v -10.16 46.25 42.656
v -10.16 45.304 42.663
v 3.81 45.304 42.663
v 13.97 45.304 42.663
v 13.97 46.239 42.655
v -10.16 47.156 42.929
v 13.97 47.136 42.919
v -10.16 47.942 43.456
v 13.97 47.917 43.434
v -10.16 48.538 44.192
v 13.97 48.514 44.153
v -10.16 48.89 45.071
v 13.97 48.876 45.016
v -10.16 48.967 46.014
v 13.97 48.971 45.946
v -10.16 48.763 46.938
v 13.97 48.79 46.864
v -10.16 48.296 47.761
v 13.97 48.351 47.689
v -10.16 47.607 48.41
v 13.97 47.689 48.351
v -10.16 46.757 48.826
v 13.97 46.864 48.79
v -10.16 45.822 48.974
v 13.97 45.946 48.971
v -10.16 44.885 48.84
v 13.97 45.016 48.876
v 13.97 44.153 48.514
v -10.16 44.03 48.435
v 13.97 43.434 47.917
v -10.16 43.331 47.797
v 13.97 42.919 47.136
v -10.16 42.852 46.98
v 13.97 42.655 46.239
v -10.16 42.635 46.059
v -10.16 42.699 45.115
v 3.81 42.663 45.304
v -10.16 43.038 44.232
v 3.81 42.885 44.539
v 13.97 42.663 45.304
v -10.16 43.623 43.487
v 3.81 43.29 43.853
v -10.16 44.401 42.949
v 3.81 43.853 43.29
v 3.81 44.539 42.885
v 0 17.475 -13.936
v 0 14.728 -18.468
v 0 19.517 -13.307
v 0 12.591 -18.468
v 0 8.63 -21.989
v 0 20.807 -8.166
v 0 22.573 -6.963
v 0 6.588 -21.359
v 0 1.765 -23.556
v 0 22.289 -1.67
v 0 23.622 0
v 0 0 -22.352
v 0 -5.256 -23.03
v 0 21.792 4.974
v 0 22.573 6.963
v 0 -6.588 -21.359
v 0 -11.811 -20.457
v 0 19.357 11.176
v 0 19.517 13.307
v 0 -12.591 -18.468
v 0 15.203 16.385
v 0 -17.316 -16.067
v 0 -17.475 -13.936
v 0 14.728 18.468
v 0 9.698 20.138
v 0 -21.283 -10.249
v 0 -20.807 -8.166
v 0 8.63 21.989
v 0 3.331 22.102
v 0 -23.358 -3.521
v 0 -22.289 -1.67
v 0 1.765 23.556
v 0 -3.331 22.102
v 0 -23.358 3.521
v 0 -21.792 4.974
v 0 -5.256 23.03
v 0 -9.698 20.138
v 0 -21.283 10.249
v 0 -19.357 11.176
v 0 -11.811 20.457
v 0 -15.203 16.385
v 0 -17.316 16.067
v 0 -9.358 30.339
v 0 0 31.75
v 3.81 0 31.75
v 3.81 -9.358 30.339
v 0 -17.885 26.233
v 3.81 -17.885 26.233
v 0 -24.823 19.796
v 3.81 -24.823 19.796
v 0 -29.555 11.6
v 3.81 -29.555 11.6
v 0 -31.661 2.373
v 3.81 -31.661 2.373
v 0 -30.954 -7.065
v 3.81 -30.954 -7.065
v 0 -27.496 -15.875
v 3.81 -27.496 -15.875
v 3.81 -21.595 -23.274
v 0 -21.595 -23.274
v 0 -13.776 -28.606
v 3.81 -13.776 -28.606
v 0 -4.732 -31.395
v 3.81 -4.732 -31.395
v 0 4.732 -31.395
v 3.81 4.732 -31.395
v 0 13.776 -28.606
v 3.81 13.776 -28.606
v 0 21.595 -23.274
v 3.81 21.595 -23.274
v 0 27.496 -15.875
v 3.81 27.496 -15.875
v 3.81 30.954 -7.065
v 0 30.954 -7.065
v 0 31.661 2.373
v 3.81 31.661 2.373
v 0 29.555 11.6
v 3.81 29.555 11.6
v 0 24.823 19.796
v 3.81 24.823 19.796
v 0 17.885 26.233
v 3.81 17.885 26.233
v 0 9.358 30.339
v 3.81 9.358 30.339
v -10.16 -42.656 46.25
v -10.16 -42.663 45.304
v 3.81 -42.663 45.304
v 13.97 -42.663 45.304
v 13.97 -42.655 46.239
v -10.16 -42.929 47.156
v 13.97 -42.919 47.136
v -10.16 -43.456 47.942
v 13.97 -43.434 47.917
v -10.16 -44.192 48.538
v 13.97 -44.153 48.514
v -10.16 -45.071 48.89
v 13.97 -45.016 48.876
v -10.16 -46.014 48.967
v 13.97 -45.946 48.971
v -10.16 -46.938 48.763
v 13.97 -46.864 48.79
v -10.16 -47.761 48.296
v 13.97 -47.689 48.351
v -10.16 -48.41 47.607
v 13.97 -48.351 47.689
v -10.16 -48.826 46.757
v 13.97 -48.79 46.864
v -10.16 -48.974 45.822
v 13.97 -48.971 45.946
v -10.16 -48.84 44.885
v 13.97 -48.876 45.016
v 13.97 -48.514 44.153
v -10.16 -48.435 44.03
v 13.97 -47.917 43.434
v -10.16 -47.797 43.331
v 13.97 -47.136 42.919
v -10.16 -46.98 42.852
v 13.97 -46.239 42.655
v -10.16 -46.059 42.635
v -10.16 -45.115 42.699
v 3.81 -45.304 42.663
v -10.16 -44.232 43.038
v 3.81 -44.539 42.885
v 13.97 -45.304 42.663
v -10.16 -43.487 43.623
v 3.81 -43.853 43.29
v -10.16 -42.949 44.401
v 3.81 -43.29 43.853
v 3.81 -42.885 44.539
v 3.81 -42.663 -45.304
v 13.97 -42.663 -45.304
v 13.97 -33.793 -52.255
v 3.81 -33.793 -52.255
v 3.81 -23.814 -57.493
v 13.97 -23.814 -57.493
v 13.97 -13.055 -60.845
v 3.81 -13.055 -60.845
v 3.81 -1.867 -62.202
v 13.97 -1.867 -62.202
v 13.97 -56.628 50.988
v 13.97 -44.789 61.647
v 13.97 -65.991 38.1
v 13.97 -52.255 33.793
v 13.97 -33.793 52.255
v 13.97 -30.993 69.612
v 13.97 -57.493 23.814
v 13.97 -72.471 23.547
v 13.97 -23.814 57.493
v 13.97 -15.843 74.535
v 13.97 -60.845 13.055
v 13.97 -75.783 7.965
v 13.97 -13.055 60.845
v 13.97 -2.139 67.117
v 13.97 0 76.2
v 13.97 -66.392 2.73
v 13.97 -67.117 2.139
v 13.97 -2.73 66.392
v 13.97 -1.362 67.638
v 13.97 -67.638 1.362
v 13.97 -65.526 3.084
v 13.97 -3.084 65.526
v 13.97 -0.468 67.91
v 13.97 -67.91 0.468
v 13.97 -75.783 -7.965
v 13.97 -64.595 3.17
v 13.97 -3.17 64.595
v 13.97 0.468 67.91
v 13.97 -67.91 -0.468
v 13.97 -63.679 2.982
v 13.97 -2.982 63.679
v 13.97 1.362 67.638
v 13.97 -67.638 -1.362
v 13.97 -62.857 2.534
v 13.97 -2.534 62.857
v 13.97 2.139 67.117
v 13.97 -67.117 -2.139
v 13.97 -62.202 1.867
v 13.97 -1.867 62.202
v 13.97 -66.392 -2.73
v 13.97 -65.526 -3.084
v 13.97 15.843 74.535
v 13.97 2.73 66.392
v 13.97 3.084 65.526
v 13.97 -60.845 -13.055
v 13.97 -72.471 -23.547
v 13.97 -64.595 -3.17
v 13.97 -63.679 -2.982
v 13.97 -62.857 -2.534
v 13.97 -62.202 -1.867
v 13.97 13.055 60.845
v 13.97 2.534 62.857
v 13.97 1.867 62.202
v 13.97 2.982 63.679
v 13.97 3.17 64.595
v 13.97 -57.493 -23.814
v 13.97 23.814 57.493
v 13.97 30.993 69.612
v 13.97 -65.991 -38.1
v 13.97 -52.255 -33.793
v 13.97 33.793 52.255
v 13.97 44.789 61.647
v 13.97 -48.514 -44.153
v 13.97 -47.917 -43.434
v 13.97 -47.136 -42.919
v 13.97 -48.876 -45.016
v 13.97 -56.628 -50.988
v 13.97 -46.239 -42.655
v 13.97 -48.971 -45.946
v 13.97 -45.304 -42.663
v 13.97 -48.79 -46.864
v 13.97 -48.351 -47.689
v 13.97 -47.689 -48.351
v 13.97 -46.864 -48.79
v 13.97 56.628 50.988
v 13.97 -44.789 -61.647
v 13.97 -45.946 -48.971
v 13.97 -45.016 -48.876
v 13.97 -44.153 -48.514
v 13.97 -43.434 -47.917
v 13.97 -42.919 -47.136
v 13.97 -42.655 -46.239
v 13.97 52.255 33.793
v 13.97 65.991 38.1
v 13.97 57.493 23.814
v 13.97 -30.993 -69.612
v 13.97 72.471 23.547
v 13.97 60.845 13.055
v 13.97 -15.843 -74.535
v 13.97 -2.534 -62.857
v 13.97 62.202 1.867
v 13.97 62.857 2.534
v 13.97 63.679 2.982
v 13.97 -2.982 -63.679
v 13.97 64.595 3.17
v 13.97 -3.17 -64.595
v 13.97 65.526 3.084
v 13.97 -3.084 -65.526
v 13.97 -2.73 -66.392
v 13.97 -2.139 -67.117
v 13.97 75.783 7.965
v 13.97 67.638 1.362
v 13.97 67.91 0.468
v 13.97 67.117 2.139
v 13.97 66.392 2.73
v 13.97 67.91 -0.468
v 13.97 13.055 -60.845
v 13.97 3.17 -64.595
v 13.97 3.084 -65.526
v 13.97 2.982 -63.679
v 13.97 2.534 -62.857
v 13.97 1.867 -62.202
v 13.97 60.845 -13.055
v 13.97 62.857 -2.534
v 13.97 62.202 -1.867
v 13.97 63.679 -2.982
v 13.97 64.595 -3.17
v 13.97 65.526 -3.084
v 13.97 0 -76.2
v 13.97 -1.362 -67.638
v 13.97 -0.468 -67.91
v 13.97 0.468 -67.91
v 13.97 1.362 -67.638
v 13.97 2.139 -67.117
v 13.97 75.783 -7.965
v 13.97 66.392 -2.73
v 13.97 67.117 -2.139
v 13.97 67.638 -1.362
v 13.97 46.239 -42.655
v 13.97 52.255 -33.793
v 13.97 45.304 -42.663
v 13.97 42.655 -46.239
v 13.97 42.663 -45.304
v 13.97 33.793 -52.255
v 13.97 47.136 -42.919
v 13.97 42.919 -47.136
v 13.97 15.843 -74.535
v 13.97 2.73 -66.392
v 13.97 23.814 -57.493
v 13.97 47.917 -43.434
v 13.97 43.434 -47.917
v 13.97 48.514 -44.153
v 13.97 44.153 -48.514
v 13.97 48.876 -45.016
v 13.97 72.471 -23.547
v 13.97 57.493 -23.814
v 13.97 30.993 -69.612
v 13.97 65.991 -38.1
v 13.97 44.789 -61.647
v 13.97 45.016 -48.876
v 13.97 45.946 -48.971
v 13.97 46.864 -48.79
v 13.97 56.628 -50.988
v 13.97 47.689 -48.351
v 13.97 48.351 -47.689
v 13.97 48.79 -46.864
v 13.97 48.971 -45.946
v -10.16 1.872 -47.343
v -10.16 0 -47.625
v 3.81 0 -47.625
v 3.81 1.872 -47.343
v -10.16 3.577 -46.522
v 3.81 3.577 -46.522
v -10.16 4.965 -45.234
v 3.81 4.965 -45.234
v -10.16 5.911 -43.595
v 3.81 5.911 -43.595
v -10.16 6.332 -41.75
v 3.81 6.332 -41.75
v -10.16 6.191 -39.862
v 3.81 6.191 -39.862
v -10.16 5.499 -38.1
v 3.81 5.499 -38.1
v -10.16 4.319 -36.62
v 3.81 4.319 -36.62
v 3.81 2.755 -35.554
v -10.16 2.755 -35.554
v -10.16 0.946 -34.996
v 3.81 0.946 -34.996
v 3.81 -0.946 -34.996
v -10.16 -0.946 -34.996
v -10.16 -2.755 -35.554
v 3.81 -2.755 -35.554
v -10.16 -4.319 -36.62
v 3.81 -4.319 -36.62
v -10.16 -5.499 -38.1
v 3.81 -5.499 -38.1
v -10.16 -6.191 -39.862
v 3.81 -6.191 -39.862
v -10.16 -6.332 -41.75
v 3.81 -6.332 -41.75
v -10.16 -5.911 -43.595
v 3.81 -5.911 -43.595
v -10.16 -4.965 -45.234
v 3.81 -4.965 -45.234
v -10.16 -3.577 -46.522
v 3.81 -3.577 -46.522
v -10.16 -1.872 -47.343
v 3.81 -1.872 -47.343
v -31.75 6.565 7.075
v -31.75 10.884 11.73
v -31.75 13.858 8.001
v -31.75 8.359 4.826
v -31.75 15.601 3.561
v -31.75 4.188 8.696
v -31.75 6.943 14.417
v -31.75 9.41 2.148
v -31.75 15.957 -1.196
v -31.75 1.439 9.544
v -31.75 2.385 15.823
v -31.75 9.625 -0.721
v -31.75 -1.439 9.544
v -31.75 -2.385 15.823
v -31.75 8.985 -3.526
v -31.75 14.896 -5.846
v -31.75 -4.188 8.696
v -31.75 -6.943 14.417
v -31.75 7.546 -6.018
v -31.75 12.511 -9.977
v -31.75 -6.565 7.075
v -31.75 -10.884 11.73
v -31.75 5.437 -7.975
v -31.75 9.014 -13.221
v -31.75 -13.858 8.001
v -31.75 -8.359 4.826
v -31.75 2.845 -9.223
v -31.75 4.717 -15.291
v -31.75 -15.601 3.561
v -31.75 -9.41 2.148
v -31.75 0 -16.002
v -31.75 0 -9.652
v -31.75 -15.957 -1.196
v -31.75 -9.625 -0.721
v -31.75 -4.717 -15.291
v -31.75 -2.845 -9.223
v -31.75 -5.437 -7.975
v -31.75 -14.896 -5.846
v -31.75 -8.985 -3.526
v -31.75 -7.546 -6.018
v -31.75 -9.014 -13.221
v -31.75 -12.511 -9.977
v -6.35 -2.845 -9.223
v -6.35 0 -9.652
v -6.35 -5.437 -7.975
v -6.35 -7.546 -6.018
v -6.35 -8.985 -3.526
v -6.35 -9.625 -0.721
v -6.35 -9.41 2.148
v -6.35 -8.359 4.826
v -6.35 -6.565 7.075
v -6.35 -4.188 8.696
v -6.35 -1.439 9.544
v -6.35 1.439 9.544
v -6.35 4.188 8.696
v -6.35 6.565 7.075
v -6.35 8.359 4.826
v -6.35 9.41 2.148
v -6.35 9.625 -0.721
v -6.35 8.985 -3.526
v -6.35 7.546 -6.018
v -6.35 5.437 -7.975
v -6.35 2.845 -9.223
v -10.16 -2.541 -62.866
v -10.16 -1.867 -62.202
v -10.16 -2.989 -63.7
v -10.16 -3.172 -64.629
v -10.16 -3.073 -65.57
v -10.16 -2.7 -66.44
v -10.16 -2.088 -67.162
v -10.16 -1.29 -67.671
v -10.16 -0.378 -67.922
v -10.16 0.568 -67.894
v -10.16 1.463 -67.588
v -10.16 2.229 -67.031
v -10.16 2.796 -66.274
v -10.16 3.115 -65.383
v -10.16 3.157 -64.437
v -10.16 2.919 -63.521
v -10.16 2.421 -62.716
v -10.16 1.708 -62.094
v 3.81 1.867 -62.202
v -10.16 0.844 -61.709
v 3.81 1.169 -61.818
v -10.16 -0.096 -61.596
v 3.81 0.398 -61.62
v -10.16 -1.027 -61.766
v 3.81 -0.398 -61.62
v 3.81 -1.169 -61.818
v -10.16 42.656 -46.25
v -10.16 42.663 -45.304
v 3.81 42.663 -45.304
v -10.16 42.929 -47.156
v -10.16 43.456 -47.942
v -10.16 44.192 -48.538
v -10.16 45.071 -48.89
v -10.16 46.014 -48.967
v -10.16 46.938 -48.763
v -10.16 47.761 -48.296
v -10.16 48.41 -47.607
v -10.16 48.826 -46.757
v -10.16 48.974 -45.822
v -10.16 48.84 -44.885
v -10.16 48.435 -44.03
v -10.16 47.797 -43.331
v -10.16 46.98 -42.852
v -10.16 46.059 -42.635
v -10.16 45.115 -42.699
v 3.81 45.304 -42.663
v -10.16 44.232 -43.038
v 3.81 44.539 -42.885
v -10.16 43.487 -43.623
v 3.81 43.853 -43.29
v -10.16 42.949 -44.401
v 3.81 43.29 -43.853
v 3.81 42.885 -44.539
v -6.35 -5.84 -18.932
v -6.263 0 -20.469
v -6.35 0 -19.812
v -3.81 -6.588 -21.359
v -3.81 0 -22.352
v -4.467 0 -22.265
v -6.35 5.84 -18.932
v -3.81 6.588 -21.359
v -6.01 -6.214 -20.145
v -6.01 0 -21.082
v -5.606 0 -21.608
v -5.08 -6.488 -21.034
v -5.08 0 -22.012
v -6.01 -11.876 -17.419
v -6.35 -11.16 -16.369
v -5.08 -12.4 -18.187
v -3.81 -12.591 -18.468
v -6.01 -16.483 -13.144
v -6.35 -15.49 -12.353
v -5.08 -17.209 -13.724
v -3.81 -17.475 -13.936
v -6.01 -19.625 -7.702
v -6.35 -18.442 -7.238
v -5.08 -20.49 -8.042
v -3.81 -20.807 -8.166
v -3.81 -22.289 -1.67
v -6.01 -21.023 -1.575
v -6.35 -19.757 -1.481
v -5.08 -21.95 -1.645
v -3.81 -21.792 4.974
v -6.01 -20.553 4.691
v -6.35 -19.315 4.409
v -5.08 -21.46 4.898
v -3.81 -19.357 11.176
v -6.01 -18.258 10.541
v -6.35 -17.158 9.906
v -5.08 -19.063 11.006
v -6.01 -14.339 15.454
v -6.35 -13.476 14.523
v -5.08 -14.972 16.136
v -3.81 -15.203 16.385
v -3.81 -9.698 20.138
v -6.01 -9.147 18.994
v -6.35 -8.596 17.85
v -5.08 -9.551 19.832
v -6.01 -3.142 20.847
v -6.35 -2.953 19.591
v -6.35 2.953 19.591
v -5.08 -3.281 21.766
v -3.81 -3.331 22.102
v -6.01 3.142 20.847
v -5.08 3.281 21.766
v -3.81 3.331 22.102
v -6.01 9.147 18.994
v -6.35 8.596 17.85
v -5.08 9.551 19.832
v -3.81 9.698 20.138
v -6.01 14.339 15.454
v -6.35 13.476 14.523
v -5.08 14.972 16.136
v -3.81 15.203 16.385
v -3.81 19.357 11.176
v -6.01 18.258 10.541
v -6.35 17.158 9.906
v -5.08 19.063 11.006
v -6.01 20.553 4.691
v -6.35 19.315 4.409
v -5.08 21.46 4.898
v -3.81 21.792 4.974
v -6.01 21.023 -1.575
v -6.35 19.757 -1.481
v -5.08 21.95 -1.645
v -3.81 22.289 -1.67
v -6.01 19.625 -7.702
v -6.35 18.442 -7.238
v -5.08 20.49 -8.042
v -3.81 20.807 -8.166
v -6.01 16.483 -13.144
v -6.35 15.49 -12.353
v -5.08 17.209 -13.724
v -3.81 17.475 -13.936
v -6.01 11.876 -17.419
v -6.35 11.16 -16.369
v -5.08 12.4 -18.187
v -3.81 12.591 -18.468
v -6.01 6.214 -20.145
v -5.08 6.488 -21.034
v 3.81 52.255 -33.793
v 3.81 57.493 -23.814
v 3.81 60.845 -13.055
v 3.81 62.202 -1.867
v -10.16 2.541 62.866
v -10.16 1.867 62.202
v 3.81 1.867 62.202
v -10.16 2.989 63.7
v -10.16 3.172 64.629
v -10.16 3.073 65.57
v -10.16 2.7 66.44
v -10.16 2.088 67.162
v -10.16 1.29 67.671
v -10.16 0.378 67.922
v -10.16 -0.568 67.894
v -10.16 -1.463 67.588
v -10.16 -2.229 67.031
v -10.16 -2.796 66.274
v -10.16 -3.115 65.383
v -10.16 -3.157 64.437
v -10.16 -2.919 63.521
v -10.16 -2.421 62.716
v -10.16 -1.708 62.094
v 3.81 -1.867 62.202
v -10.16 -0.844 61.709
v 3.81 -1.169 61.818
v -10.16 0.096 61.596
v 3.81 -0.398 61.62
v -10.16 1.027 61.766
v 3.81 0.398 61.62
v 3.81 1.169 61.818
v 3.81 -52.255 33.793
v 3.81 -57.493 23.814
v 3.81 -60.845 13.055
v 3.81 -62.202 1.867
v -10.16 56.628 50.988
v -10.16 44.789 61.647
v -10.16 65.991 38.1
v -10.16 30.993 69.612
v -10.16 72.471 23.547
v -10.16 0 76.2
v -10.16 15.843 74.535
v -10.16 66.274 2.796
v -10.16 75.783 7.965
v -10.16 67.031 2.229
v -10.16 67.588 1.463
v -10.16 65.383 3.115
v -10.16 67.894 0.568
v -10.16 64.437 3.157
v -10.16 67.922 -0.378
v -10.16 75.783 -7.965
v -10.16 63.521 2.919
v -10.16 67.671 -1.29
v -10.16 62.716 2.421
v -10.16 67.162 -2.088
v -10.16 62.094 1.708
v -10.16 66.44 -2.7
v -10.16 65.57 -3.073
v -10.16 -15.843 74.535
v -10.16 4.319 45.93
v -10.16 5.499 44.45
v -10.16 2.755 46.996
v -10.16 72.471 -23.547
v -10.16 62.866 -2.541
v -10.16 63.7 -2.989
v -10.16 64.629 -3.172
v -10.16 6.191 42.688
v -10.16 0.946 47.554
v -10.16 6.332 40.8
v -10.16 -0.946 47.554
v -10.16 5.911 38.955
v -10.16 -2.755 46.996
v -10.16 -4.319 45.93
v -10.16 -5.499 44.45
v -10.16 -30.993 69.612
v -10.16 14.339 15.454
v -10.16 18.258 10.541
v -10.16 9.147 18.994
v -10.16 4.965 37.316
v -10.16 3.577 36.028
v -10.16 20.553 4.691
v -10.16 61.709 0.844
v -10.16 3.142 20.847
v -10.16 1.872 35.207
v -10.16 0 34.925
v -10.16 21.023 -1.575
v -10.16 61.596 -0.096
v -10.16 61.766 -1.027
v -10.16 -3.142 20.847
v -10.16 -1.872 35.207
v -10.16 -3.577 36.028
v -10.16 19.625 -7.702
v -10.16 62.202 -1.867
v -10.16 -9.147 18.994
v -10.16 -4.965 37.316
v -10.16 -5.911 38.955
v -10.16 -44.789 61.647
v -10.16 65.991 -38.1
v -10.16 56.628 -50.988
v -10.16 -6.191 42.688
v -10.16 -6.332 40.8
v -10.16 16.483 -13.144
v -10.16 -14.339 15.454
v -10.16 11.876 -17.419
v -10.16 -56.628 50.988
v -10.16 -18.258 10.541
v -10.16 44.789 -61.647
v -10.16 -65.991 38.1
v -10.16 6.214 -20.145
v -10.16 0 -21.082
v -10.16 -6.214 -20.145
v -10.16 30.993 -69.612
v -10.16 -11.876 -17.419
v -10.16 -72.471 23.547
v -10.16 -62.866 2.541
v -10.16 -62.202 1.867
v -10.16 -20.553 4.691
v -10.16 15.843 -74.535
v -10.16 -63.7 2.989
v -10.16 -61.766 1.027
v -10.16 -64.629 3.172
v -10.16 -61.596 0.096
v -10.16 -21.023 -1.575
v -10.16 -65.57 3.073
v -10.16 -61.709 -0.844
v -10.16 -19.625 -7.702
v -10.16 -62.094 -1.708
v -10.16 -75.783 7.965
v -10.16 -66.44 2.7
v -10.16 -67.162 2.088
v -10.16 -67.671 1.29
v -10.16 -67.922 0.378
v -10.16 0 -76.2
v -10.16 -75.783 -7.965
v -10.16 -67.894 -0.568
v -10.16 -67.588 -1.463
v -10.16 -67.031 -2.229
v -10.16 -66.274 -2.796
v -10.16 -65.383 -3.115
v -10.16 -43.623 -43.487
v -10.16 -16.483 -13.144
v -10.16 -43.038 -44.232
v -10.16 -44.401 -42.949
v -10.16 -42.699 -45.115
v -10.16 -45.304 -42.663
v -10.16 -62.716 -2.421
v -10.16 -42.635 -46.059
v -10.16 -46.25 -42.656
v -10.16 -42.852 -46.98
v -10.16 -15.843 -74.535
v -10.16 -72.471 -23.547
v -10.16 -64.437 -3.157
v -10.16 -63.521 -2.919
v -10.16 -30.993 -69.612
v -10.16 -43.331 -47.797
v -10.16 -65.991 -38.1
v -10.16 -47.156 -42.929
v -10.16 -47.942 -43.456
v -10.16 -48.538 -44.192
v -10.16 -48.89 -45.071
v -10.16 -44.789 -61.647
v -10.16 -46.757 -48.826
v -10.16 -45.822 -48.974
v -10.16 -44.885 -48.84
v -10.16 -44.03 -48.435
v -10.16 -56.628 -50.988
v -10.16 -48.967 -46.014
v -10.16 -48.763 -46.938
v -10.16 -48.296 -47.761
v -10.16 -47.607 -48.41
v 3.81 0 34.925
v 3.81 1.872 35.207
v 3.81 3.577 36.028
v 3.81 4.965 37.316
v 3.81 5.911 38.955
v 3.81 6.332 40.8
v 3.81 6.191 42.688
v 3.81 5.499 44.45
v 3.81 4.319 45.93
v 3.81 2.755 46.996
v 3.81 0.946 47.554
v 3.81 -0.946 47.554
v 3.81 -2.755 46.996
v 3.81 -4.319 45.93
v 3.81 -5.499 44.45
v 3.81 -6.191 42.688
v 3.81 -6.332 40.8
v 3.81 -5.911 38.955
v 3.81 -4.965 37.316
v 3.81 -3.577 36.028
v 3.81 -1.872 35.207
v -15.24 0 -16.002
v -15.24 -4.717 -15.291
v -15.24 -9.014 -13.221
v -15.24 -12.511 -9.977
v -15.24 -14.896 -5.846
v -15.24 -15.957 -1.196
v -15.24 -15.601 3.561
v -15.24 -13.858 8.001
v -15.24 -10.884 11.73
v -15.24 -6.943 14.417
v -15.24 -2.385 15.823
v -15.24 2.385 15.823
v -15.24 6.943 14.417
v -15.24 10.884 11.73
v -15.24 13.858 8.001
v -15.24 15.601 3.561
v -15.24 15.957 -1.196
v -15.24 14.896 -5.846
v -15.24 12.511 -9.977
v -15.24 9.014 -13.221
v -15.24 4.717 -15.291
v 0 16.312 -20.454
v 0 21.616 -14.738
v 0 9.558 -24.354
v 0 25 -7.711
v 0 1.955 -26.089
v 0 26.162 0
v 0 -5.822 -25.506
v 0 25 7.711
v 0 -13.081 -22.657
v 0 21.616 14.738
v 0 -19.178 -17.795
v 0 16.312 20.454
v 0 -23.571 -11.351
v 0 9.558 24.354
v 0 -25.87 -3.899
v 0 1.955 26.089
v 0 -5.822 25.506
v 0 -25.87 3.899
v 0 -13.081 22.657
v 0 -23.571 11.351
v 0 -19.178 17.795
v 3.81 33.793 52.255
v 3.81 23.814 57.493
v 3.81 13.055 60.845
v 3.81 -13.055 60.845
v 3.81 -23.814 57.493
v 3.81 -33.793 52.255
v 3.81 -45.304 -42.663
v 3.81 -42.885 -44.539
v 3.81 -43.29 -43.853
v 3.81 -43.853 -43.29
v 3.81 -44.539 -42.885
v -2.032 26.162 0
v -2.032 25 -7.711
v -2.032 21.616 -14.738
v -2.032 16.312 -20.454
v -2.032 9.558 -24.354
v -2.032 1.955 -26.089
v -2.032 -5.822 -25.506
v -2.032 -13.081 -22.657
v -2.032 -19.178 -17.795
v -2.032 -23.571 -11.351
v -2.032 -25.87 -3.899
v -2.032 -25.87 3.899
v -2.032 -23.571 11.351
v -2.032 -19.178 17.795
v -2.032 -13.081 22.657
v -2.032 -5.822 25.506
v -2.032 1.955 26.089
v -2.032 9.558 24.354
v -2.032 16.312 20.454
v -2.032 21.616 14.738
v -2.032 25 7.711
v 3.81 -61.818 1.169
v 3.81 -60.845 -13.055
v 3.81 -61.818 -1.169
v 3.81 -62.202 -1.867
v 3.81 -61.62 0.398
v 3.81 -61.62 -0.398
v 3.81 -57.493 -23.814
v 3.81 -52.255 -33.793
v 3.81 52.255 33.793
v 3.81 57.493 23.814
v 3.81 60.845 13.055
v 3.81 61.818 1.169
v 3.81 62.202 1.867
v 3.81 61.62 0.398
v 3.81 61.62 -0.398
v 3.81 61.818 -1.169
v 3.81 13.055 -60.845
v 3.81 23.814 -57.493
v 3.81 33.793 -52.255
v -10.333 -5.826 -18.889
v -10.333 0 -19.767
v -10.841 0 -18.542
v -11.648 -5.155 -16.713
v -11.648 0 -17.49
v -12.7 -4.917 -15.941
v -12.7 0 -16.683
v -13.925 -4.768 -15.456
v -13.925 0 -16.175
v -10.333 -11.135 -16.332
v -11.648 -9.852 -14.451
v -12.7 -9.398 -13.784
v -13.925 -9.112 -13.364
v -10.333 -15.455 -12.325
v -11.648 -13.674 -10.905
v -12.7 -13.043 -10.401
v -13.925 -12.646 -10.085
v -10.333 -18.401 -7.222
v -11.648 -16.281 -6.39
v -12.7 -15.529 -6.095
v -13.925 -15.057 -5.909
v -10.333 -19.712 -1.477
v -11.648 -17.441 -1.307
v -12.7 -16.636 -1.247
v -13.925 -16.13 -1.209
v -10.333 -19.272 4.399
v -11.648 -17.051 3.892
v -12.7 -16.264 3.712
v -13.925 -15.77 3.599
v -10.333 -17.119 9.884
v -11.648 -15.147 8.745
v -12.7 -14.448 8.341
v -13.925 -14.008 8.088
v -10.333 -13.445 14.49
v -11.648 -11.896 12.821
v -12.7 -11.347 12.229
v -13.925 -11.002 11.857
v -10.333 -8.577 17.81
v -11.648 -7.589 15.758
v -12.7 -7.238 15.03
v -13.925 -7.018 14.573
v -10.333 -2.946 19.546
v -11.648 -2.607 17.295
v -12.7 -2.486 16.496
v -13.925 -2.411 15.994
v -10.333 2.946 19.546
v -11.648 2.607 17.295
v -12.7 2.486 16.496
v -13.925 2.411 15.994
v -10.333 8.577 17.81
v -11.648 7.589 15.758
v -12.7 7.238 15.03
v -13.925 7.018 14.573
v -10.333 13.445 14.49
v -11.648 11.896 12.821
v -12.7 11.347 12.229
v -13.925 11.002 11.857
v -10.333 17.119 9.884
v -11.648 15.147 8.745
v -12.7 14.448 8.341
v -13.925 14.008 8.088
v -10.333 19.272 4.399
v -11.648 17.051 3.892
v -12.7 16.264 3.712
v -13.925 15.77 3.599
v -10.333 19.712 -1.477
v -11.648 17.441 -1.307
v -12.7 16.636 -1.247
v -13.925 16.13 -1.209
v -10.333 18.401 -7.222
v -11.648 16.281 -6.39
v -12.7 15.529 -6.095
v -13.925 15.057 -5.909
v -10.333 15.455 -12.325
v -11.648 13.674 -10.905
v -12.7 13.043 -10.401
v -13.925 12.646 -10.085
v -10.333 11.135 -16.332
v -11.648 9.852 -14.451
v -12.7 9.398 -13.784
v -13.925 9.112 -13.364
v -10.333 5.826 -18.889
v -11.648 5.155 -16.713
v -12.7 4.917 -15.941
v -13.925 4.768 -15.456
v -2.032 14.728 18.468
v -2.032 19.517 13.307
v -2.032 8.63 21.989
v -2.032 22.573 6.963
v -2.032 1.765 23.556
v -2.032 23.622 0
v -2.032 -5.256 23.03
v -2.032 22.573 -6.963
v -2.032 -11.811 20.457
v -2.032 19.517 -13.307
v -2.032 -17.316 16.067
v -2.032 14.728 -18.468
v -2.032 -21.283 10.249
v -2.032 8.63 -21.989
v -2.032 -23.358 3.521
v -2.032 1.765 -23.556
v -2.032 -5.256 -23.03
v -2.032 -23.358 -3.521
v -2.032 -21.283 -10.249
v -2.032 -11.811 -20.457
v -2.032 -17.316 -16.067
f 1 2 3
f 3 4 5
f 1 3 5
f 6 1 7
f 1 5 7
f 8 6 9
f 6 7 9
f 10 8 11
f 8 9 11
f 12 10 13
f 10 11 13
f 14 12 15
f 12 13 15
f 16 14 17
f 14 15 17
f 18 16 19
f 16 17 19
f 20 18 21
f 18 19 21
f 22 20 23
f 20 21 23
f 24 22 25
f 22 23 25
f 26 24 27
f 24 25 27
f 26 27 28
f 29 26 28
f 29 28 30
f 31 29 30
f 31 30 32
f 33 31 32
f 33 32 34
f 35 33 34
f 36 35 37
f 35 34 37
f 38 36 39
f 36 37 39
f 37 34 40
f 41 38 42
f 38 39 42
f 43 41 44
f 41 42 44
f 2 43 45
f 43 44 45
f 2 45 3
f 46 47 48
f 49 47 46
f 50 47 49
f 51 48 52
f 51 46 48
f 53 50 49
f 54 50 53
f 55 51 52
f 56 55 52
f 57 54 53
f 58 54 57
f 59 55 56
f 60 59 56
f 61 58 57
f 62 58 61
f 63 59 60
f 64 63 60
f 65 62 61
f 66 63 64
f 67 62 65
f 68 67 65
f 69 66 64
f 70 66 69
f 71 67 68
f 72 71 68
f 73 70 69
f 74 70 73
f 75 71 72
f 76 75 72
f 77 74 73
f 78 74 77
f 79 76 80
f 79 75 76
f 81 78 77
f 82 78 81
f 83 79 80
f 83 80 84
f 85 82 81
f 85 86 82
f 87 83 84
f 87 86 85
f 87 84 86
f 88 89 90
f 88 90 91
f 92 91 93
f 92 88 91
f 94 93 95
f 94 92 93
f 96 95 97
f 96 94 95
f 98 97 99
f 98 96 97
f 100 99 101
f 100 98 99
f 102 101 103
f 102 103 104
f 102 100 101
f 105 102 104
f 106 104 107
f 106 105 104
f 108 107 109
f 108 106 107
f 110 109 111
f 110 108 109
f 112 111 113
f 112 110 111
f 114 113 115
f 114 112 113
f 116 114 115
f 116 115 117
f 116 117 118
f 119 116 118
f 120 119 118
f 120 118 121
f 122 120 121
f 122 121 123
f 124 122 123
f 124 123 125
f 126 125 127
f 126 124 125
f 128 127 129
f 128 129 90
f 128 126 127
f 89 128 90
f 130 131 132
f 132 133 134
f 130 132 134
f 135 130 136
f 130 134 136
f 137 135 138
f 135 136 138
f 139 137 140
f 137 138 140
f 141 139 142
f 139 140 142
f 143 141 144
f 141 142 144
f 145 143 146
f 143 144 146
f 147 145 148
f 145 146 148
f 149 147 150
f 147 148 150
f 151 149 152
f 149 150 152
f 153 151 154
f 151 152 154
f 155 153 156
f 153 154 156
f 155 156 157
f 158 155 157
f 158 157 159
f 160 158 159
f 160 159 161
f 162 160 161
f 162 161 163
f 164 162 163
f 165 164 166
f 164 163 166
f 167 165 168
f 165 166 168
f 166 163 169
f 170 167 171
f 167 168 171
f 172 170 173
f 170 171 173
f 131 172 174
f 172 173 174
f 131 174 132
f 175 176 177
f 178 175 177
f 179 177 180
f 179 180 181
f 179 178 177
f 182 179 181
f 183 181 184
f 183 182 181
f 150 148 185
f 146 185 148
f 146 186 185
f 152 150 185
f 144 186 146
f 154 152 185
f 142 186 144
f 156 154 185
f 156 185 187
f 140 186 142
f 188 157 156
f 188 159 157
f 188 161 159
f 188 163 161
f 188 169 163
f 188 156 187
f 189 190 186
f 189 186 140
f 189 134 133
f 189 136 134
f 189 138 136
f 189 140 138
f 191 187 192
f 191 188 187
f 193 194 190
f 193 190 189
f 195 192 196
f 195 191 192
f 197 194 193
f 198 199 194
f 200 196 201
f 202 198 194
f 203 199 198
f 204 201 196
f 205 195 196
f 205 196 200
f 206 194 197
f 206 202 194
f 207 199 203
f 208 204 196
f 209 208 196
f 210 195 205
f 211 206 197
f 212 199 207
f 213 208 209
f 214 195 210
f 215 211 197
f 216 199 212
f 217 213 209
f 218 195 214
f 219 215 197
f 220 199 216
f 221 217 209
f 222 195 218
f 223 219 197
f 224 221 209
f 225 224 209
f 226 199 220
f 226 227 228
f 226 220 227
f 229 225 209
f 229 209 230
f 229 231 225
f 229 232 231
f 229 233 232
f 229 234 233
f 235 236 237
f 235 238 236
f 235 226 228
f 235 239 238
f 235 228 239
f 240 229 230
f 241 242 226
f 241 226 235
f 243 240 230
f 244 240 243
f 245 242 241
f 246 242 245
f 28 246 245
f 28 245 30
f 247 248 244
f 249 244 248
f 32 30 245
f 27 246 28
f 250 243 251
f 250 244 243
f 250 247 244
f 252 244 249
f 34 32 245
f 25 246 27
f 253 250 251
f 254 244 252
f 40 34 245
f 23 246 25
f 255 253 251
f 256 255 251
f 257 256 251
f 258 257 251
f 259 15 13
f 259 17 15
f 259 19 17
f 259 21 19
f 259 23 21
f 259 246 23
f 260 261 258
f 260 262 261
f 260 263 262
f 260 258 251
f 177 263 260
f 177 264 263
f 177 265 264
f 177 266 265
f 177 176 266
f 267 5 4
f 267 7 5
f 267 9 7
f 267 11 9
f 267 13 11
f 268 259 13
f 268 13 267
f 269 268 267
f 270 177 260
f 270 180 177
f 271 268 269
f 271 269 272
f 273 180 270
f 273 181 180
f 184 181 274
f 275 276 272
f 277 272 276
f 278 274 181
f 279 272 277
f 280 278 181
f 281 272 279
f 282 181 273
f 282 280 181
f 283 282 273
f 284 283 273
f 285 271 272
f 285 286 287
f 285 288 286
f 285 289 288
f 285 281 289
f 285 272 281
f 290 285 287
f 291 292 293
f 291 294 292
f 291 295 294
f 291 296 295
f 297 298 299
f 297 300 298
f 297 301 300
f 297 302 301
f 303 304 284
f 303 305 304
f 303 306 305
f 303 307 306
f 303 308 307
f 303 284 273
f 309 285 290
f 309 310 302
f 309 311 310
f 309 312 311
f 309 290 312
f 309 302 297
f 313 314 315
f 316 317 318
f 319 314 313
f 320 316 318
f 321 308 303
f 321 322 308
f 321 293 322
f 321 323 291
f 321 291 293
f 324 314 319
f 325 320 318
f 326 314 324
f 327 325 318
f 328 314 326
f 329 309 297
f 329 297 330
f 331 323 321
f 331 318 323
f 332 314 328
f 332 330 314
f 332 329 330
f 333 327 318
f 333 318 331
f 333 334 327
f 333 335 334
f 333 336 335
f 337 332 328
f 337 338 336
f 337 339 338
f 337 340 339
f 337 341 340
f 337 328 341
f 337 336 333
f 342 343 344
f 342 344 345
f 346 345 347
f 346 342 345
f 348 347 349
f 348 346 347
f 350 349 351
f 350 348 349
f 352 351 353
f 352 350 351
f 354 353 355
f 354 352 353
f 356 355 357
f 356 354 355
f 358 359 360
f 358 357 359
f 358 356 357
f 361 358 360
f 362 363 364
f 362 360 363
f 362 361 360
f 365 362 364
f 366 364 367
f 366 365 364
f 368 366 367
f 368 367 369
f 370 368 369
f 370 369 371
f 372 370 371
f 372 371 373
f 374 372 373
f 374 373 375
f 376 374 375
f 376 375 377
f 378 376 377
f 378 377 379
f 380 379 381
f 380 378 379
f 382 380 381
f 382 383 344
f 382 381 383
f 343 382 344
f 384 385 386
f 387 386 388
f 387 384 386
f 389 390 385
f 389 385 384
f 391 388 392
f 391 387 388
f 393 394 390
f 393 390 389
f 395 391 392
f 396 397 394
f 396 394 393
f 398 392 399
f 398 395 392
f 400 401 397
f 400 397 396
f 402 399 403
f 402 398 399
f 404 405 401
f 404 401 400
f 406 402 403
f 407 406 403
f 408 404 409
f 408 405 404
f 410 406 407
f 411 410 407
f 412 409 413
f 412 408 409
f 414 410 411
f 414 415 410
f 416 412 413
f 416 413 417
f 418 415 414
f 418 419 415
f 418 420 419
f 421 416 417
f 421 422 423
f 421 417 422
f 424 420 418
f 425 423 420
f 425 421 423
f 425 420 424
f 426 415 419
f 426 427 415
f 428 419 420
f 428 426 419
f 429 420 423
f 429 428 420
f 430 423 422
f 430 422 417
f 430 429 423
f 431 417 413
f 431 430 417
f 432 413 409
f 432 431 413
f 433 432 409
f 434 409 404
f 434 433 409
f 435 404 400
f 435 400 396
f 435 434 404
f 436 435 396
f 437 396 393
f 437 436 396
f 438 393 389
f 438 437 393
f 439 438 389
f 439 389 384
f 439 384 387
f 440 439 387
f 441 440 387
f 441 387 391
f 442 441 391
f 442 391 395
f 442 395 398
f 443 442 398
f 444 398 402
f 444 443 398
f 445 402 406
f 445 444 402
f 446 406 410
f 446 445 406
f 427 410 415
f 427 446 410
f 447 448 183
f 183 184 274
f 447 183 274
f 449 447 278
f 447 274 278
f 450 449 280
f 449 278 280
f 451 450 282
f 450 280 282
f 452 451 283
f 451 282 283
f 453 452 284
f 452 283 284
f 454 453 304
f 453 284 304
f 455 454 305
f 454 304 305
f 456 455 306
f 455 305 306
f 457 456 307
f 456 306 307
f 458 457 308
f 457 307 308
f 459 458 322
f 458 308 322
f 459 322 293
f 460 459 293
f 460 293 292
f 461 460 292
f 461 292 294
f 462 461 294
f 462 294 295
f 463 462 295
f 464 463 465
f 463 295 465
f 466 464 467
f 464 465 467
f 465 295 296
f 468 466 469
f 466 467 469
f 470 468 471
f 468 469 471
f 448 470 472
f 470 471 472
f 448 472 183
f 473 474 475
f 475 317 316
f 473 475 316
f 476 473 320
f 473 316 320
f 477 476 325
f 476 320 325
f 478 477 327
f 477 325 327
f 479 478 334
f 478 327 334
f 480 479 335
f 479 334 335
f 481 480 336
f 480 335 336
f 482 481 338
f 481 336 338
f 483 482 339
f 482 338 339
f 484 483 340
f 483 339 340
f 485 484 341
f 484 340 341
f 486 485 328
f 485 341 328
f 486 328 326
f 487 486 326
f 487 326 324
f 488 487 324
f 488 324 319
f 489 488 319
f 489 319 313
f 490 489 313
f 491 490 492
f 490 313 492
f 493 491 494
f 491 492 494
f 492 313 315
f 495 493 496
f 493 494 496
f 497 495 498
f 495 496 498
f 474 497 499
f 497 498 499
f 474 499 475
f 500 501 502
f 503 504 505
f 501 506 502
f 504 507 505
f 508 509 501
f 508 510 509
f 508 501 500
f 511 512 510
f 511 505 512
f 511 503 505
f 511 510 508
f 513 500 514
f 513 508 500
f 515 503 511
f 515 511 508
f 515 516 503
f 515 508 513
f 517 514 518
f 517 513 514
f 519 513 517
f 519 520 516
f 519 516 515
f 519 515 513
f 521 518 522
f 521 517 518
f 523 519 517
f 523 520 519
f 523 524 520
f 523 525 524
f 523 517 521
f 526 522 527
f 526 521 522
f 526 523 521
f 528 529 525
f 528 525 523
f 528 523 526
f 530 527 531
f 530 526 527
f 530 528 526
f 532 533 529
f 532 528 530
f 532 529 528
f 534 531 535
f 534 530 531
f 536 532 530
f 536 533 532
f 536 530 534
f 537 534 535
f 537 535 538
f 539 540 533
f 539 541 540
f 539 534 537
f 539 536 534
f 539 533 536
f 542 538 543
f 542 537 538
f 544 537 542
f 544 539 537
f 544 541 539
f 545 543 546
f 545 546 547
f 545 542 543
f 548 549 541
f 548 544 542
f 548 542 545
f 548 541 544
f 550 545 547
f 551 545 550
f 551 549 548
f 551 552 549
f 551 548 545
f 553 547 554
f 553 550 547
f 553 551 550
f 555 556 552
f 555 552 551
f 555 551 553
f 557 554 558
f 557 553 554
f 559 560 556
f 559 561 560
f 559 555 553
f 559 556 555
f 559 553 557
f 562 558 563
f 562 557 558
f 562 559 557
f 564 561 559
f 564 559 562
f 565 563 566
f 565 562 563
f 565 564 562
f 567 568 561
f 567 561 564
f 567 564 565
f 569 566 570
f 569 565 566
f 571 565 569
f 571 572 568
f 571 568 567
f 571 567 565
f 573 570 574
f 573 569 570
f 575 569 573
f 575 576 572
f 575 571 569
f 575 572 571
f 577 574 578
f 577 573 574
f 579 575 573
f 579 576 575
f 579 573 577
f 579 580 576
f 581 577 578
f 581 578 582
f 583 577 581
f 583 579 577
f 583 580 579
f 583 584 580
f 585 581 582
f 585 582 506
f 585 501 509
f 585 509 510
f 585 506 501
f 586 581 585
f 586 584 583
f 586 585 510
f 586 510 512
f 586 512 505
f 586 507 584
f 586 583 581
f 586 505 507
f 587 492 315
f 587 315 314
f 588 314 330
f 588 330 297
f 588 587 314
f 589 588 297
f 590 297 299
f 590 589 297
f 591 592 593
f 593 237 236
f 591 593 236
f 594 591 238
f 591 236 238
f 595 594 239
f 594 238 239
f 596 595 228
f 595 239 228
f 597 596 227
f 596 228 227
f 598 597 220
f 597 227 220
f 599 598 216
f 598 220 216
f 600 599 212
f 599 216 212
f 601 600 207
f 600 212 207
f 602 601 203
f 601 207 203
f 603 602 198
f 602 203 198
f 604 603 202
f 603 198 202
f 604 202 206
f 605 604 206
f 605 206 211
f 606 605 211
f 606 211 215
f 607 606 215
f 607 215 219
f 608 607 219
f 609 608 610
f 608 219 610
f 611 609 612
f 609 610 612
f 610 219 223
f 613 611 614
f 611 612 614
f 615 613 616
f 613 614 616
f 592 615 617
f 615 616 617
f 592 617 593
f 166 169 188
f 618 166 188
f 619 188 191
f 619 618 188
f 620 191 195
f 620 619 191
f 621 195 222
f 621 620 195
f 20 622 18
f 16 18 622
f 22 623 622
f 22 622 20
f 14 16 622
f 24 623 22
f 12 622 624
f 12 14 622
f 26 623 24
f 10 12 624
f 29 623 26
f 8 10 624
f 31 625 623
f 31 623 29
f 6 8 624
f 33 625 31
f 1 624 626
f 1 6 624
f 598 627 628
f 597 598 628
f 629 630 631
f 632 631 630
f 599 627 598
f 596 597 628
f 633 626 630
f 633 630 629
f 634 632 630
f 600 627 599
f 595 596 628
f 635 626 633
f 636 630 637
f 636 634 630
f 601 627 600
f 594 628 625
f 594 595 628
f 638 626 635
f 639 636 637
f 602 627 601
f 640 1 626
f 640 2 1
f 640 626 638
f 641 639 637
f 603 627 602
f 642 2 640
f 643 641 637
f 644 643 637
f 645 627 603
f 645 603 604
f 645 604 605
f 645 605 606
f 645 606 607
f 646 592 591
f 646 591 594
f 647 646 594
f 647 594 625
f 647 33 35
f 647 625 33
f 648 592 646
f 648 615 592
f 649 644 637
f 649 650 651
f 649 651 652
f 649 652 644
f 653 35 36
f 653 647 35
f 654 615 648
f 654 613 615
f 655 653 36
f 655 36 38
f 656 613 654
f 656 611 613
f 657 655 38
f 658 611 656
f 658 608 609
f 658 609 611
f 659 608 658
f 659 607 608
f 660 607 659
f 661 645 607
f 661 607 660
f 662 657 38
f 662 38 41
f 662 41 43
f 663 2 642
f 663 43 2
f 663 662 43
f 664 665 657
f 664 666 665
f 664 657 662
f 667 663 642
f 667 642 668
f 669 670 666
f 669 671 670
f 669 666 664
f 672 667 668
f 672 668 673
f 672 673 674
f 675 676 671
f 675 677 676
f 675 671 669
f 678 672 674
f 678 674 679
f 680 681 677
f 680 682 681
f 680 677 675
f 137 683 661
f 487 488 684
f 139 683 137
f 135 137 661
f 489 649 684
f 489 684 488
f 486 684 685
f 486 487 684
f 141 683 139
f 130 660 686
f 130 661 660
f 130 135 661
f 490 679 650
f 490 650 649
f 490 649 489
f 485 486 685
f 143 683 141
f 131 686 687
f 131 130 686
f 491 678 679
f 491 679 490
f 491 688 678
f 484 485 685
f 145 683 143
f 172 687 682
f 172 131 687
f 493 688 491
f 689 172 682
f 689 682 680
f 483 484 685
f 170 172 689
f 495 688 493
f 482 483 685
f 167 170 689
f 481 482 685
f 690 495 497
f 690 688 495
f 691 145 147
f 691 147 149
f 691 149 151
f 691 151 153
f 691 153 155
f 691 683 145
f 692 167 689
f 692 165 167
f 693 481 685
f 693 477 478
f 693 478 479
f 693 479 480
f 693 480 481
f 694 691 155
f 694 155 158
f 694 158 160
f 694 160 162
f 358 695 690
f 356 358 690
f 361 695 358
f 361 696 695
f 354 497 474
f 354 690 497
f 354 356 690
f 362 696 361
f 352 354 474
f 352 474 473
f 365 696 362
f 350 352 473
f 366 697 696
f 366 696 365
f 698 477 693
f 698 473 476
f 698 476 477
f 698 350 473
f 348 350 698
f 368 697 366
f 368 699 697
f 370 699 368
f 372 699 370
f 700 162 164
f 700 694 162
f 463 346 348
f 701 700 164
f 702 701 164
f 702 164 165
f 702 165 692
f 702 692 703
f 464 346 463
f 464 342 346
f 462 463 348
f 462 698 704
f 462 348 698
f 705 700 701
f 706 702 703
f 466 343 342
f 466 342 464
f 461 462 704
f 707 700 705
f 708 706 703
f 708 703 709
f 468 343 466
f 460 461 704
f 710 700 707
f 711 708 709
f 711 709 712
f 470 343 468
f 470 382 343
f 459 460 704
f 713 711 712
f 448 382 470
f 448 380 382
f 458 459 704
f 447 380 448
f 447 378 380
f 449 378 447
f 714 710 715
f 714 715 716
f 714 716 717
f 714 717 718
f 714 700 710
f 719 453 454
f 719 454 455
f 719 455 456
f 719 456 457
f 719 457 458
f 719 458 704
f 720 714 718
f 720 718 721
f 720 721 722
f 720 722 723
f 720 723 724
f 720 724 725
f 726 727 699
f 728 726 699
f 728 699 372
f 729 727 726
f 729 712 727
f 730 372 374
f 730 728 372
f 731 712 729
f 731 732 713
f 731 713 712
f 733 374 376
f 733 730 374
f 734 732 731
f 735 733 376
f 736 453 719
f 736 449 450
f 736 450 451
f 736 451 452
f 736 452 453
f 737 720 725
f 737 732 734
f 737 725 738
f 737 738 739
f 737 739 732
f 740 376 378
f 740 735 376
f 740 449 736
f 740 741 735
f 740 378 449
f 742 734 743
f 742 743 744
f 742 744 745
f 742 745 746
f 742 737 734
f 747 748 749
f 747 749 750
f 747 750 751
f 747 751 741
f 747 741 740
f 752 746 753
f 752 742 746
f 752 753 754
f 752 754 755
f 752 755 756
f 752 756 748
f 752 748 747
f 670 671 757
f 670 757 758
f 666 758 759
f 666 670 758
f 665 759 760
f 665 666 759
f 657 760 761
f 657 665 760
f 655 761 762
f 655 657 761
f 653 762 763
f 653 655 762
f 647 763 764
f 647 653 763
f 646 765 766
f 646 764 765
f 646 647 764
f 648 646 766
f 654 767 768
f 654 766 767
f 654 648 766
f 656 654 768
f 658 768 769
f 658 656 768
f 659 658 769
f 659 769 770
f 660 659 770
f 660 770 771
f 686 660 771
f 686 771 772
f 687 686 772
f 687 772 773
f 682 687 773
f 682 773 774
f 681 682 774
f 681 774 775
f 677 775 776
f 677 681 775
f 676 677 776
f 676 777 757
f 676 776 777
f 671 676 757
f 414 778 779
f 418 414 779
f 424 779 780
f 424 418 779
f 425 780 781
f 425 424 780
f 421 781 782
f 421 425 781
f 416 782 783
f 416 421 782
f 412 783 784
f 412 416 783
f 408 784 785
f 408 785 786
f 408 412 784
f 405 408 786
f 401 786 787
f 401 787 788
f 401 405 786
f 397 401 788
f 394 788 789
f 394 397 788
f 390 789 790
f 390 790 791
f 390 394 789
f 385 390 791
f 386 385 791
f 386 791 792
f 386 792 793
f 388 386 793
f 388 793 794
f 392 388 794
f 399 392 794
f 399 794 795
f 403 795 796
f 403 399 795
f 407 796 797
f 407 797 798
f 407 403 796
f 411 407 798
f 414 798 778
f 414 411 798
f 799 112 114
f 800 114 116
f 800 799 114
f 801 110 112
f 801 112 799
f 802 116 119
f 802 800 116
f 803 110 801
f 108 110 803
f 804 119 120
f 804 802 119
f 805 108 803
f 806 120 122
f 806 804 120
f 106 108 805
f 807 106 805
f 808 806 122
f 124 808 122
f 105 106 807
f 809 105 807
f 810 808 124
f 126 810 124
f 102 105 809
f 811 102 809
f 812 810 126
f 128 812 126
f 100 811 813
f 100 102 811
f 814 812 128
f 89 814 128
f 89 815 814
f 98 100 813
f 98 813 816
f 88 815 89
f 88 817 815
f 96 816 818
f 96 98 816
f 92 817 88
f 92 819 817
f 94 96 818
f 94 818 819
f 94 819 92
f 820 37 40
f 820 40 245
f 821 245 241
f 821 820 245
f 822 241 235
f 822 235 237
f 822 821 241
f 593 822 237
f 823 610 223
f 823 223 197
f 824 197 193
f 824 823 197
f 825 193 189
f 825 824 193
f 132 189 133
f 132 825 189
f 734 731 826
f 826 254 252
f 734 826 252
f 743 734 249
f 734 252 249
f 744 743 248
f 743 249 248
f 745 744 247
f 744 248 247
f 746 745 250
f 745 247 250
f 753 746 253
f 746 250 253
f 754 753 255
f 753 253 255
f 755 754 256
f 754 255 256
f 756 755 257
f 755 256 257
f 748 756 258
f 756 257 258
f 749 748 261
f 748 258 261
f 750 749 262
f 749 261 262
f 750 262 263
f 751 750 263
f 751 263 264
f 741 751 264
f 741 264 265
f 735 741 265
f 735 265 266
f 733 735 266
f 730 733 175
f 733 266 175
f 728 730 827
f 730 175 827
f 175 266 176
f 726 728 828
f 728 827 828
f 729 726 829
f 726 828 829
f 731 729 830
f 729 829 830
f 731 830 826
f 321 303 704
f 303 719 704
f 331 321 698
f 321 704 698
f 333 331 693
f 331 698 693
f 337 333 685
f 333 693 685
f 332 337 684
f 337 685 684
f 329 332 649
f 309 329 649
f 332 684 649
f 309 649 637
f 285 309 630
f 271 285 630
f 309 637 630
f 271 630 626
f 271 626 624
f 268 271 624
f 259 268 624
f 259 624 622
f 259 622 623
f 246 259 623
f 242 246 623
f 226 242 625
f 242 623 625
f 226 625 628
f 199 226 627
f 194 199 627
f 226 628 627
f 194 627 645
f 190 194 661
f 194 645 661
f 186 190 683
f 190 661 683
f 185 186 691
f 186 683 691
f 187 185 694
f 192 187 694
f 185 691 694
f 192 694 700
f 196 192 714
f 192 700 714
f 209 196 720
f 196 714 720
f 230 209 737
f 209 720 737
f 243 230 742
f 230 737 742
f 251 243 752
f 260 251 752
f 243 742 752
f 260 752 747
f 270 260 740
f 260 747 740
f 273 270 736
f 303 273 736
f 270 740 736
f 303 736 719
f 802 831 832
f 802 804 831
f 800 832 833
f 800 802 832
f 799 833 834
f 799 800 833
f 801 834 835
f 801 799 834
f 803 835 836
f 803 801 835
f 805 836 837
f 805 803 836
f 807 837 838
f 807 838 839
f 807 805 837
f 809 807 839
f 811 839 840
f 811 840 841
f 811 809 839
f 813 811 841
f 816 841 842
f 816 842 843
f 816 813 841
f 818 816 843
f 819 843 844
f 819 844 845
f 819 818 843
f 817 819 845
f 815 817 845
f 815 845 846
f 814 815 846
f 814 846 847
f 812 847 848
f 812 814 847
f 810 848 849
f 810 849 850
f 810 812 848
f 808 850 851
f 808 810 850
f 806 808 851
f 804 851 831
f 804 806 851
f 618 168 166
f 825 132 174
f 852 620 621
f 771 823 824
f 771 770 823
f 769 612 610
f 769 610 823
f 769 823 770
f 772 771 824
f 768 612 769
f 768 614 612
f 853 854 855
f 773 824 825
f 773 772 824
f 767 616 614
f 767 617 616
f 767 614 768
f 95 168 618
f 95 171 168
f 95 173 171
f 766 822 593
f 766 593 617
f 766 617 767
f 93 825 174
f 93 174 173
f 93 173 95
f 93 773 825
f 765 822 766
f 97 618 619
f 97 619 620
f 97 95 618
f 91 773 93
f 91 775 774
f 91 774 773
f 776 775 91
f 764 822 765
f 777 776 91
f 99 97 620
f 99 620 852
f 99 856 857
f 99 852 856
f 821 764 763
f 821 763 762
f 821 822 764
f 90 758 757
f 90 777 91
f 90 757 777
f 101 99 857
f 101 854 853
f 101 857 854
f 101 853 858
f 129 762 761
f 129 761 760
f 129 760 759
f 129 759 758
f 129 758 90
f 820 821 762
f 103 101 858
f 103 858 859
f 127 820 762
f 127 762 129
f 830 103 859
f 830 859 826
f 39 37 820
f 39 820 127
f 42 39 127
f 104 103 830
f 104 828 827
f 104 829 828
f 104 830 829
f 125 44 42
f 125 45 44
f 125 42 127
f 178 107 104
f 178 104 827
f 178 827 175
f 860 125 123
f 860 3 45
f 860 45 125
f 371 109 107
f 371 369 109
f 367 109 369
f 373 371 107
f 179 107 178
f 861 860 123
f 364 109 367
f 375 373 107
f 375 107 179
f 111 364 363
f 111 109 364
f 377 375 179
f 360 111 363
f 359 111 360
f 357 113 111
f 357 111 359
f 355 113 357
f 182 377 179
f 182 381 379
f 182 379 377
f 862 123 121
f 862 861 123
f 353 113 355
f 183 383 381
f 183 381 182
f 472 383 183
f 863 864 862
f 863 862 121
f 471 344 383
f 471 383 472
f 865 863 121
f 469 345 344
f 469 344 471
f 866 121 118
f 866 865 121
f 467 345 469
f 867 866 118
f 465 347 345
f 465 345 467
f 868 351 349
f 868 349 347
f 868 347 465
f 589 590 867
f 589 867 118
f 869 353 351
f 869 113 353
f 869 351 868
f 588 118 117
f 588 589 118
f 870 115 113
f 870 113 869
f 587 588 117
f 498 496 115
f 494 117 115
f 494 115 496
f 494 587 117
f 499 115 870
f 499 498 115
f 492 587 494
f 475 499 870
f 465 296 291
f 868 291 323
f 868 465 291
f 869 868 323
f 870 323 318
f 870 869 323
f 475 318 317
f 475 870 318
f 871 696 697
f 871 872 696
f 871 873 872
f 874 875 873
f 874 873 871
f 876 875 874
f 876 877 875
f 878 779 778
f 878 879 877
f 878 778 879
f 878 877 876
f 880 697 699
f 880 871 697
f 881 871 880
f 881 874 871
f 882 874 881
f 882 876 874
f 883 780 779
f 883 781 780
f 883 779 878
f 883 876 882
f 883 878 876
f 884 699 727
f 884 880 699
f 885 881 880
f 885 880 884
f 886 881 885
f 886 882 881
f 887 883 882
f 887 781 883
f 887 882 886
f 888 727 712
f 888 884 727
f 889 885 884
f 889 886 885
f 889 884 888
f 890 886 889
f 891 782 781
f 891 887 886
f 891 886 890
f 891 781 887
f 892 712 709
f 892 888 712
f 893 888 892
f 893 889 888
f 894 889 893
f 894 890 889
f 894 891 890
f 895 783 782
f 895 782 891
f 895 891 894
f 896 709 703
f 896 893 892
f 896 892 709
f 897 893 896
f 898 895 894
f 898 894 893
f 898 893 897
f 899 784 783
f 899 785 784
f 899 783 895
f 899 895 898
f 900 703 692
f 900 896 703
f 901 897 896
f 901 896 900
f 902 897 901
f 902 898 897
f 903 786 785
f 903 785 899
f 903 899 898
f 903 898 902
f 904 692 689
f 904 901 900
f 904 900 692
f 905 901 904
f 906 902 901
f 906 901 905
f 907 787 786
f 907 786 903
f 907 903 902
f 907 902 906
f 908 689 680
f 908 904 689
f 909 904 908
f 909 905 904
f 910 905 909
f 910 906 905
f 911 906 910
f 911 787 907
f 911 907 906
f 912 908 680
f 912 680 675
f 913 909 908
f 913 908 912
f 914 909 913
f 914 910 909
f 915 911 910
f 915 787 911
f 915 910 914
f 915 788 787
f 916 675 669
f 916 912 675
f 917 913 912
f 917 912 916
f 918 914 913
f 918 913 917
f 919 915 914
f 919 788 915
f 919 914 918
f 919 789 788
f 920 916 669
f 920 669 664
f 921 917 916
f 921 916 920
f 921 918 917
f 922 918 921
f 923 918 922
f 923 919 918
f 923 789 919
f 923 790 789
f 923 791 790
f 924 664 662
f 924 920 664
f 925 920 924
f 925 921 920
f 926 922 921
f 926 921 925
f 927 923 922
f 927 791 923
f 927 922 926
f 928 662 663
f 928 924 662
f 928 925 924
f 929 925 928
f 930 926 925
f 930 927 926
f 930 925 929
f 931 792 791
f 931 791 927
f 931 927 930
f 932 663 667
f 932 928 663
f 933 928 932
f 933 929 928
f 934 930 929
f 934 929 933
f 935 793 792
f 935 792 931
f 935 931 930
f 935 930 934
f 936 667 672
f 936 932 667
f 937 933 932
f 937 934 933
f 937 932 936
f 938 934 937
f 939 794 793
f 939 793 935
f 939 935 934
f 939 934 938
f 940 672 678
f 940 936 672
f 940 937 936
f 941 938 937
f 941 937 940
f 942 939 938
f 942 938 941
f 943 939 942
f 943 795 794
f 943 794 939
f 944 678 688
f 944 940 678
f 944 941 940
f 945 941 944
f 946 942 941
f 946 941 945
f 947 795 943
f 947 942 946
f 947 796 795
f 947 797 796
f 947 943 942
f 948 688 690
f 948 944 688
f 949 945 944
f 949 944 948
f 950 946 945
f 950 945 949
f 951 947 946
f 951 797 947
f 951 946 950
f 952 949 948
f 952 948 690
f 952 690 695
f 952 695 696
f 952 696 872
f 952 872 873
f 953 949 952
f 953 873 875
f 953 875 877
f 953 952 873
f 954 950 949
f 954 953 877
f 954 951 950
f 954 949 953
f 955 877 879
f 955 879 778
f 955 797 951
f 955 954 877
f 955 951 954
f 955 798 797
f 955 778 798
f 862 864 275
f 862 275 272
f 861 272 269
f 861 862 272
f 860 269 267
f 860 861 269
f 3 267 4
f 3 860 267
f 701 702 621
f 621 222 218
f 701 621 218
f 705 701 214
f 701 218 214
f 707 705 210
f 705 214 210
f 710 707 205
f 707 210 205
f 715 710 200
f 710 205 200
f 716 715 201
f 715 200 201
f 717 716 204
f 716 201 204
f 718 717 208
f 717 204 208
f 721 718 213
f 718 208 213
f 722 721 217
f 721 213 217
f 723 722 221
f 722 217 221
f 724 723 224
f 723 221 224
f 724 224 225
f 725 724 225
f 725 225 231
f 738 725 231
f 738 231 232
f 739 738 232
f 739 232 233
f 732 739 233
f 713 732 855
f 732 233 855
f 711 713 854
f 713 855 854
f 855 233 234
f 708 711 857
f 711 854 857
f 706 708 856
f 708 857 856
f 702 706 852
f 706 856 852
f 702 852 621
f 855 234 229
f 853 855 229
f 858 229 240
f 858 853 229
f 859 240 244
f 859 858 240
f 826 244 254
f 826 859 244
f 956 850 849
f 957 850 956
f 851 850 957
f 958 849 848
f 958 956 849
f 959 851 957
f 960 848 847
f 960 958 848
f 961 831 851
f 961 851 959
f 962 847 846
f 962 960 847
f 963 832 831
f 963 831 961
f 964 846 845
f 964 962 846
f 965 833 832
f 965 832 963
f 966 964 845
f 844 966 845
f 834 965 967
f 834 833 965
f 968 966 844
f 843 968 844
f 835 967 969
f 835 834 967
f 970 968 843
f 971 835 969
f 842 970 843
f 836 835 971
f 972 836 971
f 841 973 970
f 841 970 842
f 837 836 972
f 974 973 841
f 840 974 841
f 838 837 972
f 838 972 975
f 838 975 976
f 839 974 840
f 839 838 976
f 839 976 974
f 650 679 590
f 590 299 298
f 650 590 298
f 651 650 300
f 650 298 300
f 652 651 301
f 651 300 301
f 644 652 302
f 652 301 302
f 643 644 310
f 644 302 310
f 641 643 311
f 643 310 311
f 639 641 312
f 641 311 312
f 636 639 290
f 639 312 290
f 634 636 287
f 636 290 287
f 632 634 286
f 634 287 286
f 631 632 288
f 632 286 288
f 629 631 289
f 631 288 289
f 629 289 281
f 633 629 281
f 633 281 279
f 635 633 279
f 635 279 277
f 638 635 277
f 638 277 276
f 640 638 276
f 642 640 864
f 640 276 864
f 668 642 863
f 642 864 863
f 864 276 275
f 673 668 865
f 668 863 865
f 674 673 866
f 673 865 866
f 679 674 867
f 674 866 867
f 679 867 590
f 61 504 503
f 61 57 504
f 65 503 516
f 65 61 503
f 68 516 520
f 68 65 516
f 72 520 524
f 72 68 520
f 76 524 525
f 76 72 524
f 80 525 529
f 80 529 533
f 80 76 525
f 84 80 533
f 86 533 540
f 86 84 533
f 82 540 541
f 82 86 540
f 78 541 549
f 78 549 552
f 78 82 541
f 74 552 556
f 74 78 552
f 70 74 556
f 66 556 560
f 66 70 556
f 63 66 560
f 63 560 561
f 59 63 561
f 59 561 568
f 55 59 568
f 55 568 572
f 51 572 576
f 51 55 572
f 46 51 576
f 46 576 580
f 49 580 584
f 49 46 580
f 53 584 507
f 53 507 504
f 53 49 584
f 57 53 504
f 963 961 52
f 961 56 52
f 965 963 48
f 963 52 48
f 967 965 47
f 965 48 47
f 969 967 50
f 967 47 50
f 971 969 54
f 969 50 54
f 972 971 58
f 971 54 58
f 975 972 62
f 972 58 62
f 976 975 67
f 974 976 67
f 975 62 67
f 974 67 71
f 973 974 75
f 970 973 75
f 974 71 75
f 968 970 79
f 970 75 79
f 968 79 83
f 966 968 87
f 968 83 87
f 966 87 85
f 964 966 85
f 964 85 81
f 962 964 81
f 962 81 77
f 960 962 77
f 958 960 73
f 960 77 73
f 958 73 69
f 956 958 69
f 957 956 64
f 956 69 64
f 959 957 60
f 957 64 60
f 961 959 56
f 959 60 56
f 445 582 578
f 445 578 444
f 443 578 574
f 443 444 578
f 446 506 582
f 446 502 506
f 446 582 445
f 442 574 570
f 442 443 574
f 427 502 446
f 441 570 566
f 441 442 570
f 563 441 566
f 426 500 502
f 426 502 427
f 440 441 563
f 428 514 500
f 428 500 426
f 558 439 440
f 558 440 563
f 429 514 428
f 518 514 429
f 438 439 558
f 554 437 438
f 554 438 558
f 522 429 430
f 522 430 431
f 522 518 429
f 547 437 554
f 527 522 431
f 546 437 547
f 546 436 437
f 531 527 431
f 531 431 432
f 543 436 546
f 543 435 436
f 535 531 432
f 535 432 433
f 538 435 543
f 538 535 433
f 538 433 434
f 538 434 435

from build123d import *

# Parameters (mm, degrees)
SKETCH4_W               = 2.032
SKETCH4_H               = 2.54
SKETCH5_R               = 76.2
SKETCH5_R_2             = 31.75
BOSS_EXTRUDE1_DEPTH     = 3.81
SKETCH6_R               = 76.2
SKETCH6_R_2             = 62.23
BOSS_EXTRUDE2_DEPTH     = 10.16
CUT_EXTRUDE1_DEPTH      = 113.342968182
CUT_EXTRUDE1_DEPTH_BACK = 113.342968182
SKETCH2_R               = 6.35
SKETCH3_R               = 3.175
CUT_EXTRUDE2_DEPTH      = 113.342968182
CIRPATTERN1_COUNT       = 8


with BuildPart() as part:
    # Sketch1 → Revolve1 (revolve)
    with BuildSketch(Plane.XY, mode=Mode.PRIVATE) as revolve1_sk:
        with BuildLine():
            Line((0, 76.2), (-10.16, 76.2))
            Line((-10.16, 76.2), (-10.16, 21.082))
            ThreePointArc((-10.16, 21.082), (-11.647897552, 17.489897552), (-15.24, 16.002))
            Line((-15.24, 16.002), (-31.75, 16.002))
            Line((-31.75, 16.002), (-31.75, 9.652))
            Line((-31.75, 9.652), (-6.35, 9.652))
            Line((-6.35, 9.652), (-6.35, 19.812))
            ThreePointArc((-6.35, 19.812), (-5.606051224, 21.608051224), (-3.81, 22.352))
            Line((-3.81, 22.352), (0, 22.352))
            Line((0, 22.352), (0, 76.2))
        make_face()
    revolve(revolve1_sk.sketch.rotate(Axis((0, 0, 0), (-1, 0, 0)), 90), axis=Axis((0, 0, 0), (-1, 0, 0)))

    # Sketch4 → Cut-Revolve1 (revolve, cut)
    with BuildSketch(Plane.XY):
        with Locations((-1.016, 24.892)):
            Rectangle(SKETCH4_W, SKETCH4_H)
    revolve(axis=Axis((0, 0, 0), (-1, 0, 0)), mode=Mode.SUBTRACT)

    # Sketch5 → Boss-Extrude1 (add)
    with BuildSketch(Plane(origin=(0, 0, 0), x_dir=(0, 0, -1), z_dir=(1, 0, 0))):
        Circle(SKETCH5_R)
        with Locations(Location((0, 0, 0), (0, 0, 180))):
            Circle(SKETCH5_R_2, mode=Mode.SUBTRACT)
    extrude(amount=BOSS_EXTRUDE1_DEPTH)

    # Sketch6 → Boss-Extrude2 (add)
    with BuildSketch(Plane(origin=(3.81, 0, 0), x_dir=(0, 0, -1), z_dir=(1, 0, 0))):
        Circle(SKETCH6_R)
        Circle(SKETCH6_R_2, mode=Mode.SUBTRACT)
    extrude(amount=BOSS_EXTRUDE2_DEPTH)

    # Sketch2 → Cut-Extrude1 (cut, two sides: drawn at the far end of the back side and taken through both)
    with BuildSketch(Plane(origin=(0, 0, 0), x_dir=(0, 0, -1), z_dir=(1, 0, 0)).offset(-CUT_EXTRUDE1_DEPTH_BACK)):
        with Locations((41.275, 0)):
            Circle(SKETCH2_R)
        with Locations((-41.275, 0)):
            Circle(SKETCH2_R)
    extrude(amount=CUT_EXTRUDE1_DEPTH + CUT_EXTRUDE1_DEPTH_BACK, mode=Mode.SUBTRACT)

    # Sketch3 → Cut-Extrude2 (cut, symmetric)
    with BuildSketch(Plane(origin=(0, 0, 0), x_dir=(0, 0, -1), z_dir=(1, 0, 0))):
        with Locations(Location((64.77, 0, 0), (0, 0, 216.018854193))):
            Circle(SKETCH3_R)
    cut_extrude2 = extrude(amount=CUT_EXTRUDE2_DEPTH, both=True, mode=Mode.SUBTRACT)

    # CirPattern1: Cut-Extrude2 ×8 about axis
    cirpattern1_axis = Axis((0, 0, 0), (1, 0, 0))
    for i in range(1, CIRPATTERN1_COUNT):
        add(cut_extrude2.rotate(cirpattern1_axis, i * 360 / CIRPATTERN1_COUNT), mode=Mode.SUBTRACT)


solid = part.part
